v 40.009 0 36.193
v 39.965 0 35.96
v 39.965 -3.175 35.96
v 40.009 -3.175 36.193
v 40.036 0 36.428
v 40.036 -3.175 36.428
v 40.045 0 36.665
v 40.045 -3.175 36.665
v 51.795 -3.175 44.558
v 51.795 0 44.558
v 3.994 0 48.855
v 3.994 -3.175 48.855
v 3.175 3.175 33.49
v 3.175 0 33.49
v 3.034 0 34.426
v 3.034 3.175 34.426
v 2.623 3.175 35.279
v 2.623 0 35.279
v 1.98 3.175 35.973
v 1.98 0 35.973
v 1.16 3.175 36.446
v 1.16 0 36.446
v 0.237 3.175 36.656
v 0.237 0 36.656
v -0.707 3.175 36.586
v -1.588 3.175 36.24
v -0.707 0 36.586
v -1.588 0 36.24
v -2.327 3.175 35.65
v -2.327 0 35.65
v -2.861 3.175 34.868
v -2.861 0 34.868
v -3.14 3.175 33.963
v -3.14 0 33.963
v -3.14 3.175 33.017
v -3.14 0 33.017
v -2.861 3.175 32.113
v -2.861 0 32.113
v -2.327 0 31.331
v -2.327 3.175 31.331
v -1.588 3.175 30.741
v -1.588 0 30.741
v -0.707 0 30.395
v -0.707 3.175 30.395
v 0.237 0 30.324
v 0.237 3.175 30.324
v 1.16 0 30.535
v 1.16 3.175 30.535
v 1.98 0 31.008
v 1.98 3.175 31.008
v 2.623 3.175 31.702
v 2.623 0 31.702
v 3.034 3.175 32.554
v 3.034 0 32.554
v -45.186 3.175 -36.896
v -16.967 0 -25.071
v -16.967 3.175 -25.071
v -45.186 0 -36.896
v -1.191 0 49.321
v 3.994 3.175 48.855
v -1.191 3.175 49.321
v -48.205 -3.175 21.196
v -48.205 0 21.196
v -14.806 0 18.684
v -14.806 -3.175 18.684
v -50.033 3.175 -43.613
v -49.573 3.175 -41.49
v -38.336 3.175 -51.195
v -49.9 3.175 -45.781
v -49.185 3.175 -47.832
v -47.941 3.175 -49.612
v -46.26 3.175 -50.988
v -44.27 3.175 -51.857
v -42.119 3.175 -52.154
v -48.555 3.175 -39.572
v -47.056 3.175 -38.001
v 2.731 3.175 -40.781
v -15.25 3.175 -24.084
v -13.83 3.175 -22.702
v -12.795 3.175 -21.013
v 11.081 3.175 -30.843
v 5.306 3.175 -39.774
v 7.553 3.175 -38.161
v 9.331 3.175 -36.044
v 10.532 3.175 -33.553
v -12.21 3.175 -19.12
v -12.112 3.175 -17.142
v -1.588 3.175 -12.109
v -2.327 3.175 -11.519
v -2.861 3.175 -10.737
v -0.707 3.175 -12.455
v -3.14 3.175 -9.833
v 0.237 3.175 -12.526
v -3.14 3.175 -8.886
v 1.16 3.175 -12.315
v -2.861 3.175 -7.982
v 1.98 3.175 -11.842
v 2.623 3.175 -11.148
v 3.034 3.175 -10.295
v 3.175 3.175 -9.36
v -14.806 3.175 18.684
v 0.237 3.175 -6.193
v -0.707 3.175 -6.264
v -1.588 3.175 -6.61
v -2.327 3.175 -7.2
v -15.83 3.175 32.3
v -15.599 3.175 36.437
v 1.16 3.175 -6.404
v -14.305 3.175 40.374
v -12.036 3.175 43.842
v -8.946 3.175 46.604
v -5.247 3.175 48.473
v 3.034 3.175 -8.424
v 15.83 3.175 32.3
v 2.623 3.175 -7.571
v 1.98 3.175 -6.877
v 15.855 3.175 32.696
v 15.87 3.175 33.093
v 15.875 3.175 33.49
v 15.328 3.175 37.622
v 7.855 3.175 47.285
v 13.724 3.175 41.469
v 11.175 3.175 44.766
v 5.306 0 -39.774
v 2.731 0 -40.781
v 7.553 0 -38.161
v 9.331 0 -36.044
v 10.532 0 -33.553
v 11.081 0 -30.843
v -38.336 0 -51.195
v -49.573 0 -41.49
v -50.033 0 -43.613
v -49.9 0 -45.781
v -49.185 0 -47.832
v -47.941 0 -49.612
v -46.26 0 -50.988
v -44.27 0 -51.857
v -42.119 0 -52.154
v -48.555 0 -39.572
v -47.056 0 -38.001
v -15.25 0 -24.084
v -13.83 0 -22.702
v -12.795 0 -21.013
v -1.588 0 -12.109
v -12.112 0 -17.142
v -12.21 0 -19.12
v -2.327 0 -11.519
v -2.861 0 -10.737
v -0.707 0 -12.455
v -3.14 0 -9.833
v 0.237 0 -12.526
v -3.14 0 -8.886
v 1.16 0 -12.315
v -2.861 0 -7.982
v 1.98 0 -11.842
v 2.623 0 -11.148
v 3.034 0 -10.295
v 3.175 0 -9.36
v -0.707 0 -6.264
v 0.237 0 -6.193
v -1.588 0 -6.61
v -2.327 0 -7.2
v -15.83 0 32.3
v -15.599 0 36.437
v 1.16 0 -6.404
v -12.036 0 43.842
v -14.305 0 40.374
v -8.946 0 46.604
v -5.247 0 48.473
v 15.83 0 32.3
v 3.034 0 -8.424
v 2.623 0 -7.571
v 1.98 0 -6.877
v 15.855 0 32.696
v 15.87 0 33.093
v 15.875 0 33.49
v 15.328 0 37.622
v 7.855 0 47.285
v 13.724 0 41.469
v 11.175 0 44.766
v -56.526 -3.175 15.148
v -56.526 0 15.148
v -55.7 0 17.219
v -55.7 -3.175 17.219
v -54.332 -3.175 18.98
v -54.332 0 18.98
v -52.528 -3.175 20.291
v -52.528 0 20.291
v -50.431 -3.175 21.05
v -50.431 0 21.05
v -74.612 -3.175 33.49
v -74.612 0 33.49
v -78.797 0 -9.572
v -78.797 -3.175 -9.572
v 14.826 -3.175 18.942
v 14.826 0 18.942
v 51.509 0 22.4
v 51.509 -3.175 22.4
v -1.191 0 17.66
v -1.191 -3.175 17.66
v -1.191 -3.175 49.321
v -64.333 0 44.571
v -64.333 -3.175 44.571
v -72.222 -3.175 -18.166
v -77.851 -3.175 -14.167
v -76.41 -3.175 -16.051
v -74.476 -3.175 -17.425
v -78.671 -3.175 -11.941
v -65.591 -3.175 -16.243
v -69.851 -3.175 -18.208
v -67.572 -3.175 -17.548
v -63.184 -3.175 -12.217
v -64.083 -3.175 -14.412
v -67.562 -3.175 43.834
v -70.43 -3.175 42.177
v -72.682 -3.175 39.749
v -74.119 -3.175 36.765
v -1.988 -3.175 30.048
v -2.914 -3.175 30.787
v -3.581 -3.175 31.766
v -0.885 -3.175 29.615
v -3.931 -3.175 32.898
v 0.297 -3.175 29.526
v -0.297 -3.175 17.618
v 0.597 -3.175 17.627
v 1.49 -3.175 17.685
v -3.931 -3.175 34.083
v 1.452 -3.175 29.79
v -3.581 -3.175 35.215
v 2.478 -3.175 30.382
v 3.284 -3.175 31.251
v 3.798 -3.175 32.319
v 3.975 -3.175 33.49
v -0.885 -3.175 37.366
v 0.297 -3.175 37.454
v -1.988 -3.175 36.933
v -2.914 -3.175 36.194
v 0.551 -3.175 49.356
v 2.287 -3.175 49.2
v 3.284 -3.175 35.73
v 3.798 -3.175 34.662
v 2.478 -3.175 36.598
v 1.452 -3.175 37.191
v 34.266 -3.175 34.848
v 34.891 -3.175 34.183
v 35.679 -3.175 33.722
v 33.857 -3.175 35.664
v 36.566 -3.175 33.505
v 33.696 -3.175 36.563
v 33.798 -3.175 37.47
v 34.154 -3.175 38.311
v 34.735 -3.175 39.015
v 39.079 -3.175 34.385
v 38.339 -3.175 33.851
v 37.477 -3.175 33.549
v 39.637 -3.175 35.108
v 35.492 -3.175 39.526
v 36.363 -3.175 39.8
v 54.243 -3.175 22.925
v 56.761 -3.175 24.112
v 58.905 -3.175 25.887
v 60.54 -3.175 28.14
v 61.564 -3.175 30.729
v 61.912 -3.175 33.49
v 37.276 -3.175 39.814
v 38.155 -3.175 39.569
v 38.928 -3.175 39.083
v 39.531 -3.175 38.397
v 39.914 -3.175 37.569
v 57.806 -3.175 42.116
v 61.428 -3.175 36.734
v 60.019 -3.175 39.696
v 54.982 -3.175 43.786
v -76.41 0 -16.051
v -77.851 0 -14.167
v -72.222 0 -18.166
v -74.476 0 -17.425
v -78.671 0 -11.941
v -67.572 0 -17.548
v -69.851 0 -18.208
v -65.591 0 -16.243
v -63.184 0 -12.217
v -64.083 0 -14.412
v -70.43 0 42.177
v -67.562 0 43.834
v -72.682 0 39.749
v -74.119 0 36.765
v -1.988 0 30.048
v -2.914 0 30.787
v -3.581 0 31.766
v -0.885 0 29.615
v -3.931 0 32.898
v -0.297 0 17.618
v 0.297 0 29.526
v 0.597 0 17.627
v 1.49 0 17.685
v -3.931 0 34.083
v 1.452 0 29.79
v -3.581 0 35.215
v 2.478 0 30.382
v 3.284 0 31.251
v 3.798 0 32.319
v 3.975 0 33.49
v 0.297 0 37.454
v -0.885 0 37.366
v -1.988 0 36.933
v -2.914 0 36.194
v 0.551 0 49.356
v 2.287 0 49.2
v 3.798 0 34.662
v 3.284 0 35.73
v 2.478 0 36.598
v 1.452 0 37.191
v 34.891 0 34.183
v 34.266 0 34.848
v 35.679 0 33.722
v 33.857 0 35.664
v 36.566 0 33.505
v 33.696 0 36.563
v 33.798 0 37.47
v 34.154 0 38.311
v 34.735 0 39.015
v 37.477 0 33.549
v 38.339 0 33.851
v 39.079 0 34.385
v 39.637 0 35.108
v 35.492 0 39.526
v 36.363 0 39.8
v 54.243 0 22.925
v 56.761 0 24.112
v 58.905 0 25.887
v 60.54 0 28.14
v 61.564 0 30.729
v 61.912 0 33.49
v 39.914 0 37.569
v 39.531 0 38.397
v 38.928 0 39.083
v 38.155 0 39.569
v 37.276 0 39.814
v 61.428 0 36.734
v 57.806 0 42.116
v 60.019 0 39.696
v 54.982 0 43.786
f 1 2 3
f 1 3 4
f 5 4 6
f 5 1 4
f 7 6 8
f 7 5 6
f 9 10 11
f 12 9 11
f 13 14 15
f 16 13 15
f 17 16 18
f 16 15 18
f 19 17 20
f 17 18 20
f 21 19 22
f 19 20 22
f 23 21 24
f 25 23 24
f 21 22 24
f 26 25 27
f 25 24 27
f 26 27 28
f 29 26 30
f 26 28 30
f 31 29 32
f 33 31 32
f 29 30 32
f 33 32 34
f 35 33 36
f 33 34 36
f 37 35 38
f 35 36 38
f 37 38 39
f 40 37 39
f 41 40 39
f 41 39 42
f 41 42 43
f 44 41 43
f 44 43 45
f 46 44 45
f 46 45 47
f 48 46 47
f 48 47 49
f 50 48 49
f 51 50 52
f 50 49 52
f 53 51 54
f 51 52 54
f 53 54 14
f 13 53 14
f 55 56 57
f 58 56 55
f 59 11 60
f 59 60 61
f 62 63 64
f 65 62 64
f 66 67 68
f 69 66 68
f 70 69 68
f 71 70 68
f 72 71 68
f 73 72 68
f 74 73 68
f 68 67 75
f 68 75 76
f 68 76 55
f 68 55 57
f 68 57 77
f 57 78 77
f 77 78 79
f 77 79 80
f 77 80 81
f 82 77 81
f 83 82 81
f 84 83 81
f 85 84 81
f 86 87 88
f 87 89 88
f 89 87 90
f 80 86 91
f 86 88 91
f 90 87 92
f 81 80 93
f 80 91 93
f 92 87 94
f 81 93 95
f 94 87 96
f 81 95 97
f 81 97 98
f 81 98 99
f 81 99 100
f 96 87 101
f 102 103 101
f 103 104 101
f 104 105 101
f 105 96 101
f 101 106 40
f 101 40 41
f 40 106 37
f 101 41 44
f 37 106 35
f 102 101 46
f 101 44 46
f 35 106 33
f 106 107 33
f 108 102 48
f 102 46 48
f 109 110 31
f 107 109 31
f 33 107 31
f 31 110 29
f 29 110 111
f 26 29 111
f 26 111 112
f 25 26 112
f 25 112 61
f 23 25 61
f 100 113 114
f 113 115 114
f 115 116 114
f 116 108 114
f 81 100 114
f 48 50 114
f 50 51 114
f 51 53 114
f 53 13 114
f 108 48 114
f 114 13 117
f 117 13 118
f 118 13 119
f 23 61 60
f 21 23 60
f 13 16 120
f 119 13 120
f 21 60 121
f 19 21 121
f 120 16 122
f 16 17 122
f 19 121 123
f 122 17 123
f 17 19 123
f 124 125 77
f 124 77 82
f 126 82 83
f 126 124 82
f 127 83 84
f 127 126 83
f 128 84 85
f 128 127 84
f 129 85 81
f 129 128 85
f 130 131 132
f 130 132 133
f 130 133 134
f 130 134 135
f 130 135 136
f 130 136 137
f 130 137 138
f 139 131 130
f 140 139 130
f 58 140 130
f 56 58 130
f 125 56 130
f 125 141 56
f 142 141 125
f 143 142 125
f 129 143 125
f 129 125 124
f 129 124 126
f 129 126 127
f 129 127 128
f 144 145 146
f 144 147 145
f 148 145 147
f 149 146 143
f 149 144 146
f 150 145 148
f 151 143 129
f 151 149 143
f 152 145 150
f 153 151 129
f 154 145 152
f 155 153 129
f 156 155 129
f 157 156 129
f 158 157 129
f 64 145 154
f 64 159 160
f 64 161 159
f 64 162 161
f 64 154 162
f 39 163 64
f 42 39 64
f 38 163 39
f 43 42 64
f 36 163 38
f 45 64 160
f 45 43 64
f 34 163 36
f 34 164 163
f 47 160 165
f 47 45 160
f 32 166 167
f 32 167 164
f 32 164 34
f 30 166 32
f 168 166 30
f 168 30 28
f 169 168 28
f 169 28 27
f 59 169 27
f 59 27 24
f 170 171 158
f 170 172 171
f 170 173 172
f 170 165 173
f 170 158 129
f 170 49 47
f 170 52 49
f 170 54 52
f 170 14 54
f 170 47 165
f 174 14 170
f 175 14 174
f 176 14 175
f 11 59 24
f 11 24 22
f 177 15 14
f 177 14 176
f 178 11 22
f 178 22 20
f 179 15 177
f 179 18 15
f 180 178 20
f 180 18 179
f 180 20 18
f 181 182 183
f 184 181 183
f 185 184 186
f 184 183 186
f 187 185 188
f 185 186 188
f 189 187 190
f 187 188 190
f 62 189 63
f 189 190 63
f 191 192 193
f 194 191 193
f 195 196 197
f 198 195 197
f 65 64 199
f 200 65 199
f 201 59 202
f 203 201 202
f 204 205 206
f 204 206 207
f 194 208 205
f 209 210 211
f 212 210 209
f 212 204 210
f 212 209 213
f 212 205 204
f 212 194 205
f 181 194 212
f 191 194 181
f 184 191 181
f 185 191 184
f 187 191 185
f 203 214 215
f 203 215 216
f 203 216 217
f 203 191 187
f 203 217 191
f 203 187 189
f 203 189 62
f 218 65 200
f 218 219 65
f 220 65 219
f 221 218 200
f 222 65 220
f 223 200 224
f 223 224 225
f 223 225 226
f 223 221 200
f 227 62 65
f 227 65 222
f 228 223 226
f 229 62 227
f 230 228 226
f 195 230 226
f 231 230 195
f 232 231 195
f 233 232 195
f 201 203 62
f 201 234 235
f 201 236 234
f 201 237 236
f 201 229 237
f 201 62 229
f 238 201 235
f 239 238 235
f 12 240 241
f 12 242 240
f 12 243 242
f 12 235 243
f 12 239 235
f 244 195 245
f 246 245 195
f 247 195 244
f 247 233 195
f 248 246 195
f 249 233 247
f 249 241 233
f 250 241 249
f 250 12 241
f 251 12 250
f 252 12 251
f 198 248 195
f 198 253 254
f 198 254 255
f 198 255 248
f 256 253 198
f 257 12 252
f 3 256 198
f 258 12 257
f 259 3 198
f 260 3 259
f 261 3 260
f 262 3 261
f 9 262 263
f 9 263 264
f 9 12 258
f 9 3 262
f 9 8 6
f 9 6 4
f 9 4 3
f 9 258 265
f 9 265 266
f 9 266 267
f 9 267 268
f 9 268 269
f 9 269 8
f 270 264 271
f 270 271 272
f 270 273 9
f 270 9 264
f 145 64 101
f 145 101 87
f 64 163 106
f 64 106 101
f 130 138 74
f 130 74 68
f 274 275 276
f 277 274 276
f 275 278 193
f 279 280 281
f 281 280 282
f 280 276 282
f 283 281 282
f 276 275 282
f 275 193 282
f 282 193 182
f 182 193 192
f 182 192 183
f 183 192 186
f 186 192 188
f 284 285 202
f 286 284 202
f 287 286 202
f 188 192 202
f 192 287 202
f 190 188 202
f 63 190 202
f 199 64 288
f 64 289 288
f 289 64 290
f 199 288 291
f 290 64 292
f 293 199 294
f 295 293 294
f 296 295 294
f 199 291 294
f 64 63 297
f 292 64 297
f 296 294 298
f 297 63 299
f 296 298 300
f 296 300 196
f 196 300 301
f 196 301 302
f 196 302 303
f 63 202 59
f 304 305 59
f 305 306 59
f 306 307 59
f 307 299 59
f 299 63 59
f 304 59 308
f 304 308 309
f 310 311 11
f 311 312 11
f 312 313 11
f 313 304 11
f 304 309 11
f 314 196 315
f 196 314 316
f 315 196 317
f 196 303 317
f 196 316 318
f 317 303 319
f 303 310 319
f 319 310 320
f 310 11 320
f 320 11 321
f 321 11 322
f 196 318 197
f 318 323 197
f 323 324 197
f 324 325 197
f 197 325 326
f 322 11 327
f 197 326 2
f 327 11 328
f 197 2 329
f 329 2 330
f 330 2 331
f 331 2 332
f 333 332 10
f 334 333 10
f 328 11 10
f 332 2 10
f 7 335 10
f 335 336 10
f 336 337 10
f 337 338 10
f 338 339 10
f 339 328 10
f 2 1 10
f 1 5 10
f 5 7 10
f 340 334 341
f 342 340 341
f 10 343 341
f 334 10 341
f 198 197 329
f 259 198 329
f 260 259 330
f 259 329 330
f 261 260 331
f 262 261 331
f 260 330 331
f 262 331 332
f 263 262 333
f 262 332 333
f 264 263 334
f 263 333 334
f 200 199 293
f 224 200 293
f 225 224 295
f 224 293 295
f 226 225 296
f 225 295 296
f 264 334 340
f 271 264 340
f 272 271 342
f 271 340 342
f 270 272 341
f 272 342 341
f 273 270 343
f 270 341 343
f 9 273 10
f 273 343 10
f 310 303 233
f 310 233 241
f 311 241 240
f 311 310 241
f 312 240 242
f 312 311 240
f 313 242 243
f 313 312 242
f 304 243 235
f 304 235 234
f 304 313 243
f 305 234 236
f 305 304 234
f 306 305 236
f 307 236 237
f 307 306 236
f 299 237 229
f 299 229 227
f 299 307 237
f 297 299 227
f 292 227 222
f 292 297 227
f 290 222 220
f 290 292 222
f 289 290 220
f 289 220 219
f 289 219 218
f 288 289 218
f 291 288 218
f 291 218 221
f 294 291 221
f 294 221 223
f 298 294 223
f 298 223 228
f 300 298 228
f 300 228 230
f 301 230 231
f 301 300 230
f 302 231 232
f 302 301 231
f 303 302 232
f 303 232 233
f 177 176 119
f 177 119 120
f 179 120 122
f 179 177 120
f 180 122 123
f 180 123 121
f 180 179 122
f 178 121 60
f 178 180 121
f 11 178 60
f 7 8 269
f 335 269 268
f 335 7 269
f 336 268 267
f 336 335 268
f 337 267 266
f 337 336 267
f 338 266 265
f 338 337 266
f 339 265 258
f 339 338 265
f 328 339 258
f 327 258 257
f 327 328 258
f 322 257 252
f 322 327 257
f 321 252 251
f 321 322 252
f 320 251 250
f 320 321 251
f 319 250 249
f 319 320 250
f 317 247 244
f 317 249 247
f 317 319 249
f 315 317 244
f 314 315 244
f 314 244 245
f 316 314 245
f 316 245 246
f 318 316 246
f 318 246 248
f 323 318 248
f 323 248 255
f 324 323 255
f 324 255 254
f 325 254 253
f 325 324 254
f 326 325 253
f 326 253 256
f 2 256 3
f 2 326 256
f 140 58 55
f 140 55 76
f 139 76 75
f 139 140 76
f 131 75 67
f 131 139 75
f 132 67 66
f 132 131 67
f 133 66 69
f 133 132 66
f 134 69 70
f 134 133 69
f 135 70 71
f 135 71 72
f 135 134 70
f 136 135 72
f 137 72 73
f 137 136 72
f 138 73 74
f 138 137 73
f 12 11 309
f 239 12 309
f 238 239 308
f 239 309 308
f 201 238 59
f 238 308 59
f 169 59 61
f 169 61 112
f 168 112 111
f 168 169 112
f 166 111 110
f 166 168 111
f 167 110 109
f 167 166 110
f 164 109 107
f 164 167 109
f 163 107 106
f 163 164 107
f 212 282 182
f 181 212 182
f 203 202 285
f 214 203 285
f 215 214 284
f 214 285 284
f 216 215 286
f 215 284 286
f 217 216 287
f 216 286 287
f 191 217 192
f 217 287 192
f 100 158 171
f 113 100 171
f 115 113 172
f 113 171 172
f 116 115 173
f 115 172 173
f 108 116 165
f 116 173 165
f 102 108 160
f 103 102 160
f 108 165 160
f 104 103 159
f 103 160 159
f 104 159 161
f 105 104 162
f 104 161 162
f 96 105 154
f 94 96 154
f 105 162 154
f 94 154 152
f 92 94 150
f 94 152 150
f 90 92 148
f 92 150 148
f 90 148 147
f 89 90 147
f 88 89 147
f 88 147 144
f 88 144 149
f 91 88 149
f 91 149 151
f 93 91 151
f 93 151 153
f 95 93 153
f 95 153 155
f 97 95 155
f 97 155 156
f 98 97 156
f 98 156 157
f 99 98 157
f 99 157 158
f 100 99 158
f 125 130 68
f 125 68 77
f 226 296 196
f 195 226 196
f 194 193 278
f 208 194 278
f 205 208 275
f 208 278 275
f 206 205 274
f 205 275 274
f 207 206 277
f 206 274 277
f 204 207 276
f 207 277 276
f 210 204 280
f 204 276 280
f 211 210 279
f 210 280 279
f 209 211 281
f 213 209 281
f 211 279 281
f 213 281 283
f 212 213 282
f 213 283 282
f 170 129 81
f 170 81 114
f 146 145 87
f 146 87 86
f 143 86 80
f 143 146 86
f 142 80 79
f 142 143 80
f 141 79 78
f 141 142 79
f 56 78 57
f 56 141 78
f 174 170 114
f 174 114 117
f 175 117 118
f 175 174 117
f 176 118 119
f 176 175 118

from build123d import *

# Parameters (mm, degrees)
F0_R     = 3.9751
F0_R_2   = 3.175
F1_DEPTH = 3.175
F2_DEPTH = 3.175
F3_DEPTH = 25.4
F4_DEPTH = 25.4


with BuildPart() as f1:
    # F0 (on Front) → F1 (new body)
    with BuildSketch(Plane.XZ):
        with BuildLine():
            ThreePointArc((-15.8302885984, 32.29963418), (-12.0356034274, 43.8420645847), (-1.190625, 49.3205477784))
            Line((-1.190625, 49.3205477784), (-64.3334375, 44.5714611988))
            ThreePointArc((-64.3334375, 44.5714611988), (-55.9426829486, 41.6373209346), (-52.3875, 33.49025918))
            ThreePointArc((-52.3875, 33.49025918), (-55.9442909745, 25.3417060954), (-64.3378113381, 22.4093869935))
            ThreePointArc((-64.3378113381, 22.4093869935), (-71.6485530846, 25.9345501545), (-74.6125, 33.49025918))
            Line((-74.6125, 33.49025918), (-78.7971892056, -9.5722352694))
            ThreePointArc((-78.7971892056, -9.5722352694), (-70.5125901007, -2.411771439), (-62.9594042993, -10.3399622065))
            ThreePointArc((-62.9594042993, -10.3399622065), (-63.0158587984, -11.2849638271), (-63.1844192443, -12.2165230305))
            Line((-63.1844192443, -12.2165230305), (-56.5262833311, 15.1477771658))
            ThreePointArc((-56.5262833311, 15.1477771658), (-53.4757934993, 19.6990979582), (-48.2051933, 21.1960223745))
            Line((-48.2051933, 21.1960223745), (-14.8062337279, 18.6840254521))
            Line((-14.8062337279, 18.6840254521), (-15.8302885984, 32.29963418))
        make_face()
        with BuildLine():
            Line((3.9944345899, 48.8545072028), (-1.190625, 49.3205477784))
            ThreePointArc((-1.190625, 49.3205477784), (-12.0356034274, 43.8420645847), (-15.8302885984, 32.29963418))
            ThreePointArc((-15.8302885984, 32.29963418), (-11.2253201513, 22.2649390286), (-1.190625, 17.6599705815))
            ThreePointArc((-1.190625, 17.6599705815), (0.1501525732, 17.6159692996), (1.4898579206, 17.6853248752))
            ThreePointArc((1.4898579206, 17.6853248752), (11.3309919236, 22.3716150618), (15.8302885984, 32.29963418))
            ThreePointArc((15.8302885984, 32.29963418), (15.8638182116, 32.8945270673), (15.875, 33.49025918))
            ThreePointArc((15.875, 33.49025918), (12.5584090178, 43.2011802456), (3.9944345899, 48.8545072028))
        make_face()
        with Locations((0, 33.49025918)):
            Circle(F0_R, mode=Mode.SUBTRACT)
        with BuildLine():
            Line((51.7947971649, 44.5581422138), (3.9944345899, 48.8545072028))
            ThreePointArc((3.9944345899, 48.8545072028), (12.5584090178, 43.2011802456), (15.875, 33.49025918))
            ThreePointArc((15.875, 33.49025918), (15.8638182116, 32.8945270673), (15.8302885984, 32.29963418))
            Line((15.8302885984, 32.29963418), (14.8256687681, 18.9424294803))
            Line((14.8256687681, 18.9424294803), (51.5091408873, 22.4004090704))
            ThreePointArc((51.5091408873, 22.4004090704), (42.3386131595, 26.2866080928), (39.9653564365, 35.9597034699))
            ThreePointArc((39.9653564365, 35.9597034699), (44.2663232789, 42.4790702668), (51.7947971649, 44.5581422138))
        make_face()
        with BuildLine():
            ThreePointArc((40.044744035, 36.66525918), (40.0248347132, 36.3102552184), (39.9653564365, 35.9597034699))
            ThreePointArc((39.9653564365, 35.9597034699), (33.7146533569, 37.0202631415), (40.044744035, 36.66525918))
        make_face(mode=Mode.SUBTRACT)
        with BuildLine():
            ThreePointArc((-52.3875, 33.49025918), (-55.9426829486, 41.6373209346), (-64.3334375, 44.5714611988))
            ThreePointArc((-64.3334375, 44.5714611988), (-71.6470617547, 41.0475762314), (-74.6125, 33.49025918))
            ThreePointArc((-74.6125, 33.49025918), (-71.6485530846, 25.9345501545), (-64.3378113381, 22.4093869935))
            ThreePointArc((-64.3378113381, 22.4093869935), (-55.9442909745, 25.3417060954), (-52.3875, 33.49025918))
        make_face()
        with Locations((-63.5, 33.49025918)):
            Circle(F0_R_2, mode=Mode.SUBTRACT)
        with BuildLine():
            ThreePointArc((61.9125, 33.49025918), (59.0019003818, 40.9880246056), (51.7947971649, 44.5581422138))
            ThreePointArc((51.7947971649, 44.5581422138), (44.2663232789, 42.4790702668), (39.9653564365, 35.9597034699))
            ThreePointArc((39.9653564365, 35.9597034699), (42.3386131595, 26.2866080928), (51.5091408873, 22.4004090704))
            ThreePointArc((51.5091408873, 22.4004090704), (58.9045661315, 25.8873870865), (61.9125, 33.49025918))
        make_face()
        with Locations((50.8, 33.49025918)):
            Circle(F0_R_2, mode=Mode.SUBTRACT)
        with BuildLine():
            ThreePointArc((-62.9594042993, -10.3399622065), (-70.5125901007, -2.411771439), (-78.7971892056, -9.5722352694))
            ThreePointArc((-78.7971892056, -9.5722352694), (-72.2223784171, -18.166010035), (-63.1844192443, -12.2165230305))
            ThreePointArc((-63.1844192443, -12.2165230305), (-63.0158587984, -11.2849638271), (-62.9594042993, -10.3399622065))
        make_face()
        with Locations((-70.8969042993, -10.3399622065)):
            Circle(F0_R_2, mode=Mode.SUBTRACT)
        with BuildLine():
            ThreePointArc((-1.190625, 17.6599705815), (-11.2253201513, 22.2649390286), (-15.8302885984, 32.29963418))
            Line((-15.8302885984, 32.29963418), (-14.8062337279, 18.6840254521))
            Line((-14.8062337279, 18.6840254521), (-1.190625, 17.6599705815))
        make_face()
        with BuildLine():
            ThreePointArc((15.8302885984, 32.29963418), (11.3309919236, 22.3716150618), (1.4898579206, 17.6853248752))
            Line((1.4898579206, 17.6853248752), (14.8256687681, 18.9424294803))
            Line((14.8256687681, 18.9424294803), (15.8302885984, 32.29963418))
        make_face()
        with Locations((-70.8969042993, -10.3399622065)):
            Circle(F0_R_2)
        with Locations((-63.5, 33.49025918)):
            Circle(F0_R_2)
        with Locations((50.8, 33.49025918)):
            Circle(F0_R_2)
        with BuildLine():
            ThreePointArc((40.044744035, 36.66525918), (33.7146533569, 37.0202631415), (39.9653564365, 35.9597034699))
            ThreePointArc((39.9653564365, 35.9597034699), (40.0248347132, 36.3102552184), (40.044744035, 36.66525918))
        make_face()
        with BuildLine():
            ThreePointArc((3.9944345899, 48.8545072028), (1.4211388069, 49.3015206569), (-1.190625, 49.3205477784))
            Line((-1.190625, 49.3205477784), (3.9944345899, 48.8545072028))
        make_face()
    extrude(amount=F1_DEPTH)

    # F0 (on Front) → F3 (cut)
    with BuildSketch(Plane.XZ):
        with BuildLine():
            ThreePointArc((40.044744035, 36.66525918), (33.7146533569, 37.0202631415), (39.9653564365, 35.9597034699))
            ThreePointArc((39.9653564365, 35.9597034699), (40.0248347132, 36.3102552184), (40.044744035, 36.66525918))
        make_face()
        with Locations((0, -9.35954082)):
            Circle(F0_R_2)
    extrude(amount=F3_DEPTH, mode=Mode.SUBTRACT)


with BuildPart() as f2:
    # F0 (on Front) → F2 (new body)
    with BuildSketch(Plane.XZ):
        with BuildLine():
            ThreePointArc((1.4898579206, 17.6853248752), (0.1501525732, 17.6159692996), (-1.190625, 17.6599705815))
            Line((-1.190625, 17.6599705815), (-14.8062337279, 18.6840254521))
            Line((-14.8062337279, 18.6840254521), (-12.1116893515, -17.1420449896))
            ThreePointArc((-12.1116893515, -17.1420449896), (-13.2595136069, -21.8901160153), (-16.9669465589, -25.0707794514))
            Line((-16.9669465589, -25.0707794514), (-45.1862193725, -36.8956038792))
            ThreePointArc((-45.1862193725, -36.8956038792), (-37.7223000594, -37.6075280366), (-34.1810762788, -44.2163601311))
            ThreePointArc((-34.1810762788, -44.2163601311), (-35.298561103, -48.2773082042), (-38.3363642794, -51.1948111513))
            Line((-38.3363642794, -51.1948111513), (2.7313370812, -40.7813448788))
            ThreePointArc((2.7313370812, -40.7813448788), (-8.7703945055, -23.1856777732), (11.1125, -30.00974082))
            ThreePointArc((11.1125, -30.00974082), (11.1046727481, -30.4267532989), (11.0812020189, -30.84317832))
            Line((11.0812020189, -30.84317832), (14.8256687681, 18.9424294803))
            Line((14.8256687681, 18.9424294803), (1.4898579206, 17.6853248752))
        make_face()
        with Locations((0, -9.35954082)):
            Circle(F0_R_2, mode=Mode.SUBTRACT)
        with BuildLine():
            Line((3.9944345899, 48.8545072028), (-1.190625, 49.3205477784))
            ThreePointArc((-1.190625, 49.3205477784), (-12.0356034274, 43.8420645847), (-15.8302885984, 32.29963418))
            ThreePointArc((-15.8302885984, 32.29963418), (-11.2253201513, 22.2649390286), (-1.190625, 17.6599705815))
            ThreePointArc((-1.190625, 17.6599705815), (0.1501525732, 17.6159692996), (1.4898579206, 17.6853248752))
            ThreePointArc((1.4898579206, 17.6853248752), (11.3309919236, 22.3716150618), (15.8302885984, 32.29963418))
            ThreePointArc((15.8302885984, 32.29963418), (15.8638182116, 32.8945270673), (15.875, 33.49025918))
            ThreePointArc((15.875, 33.49025918), (12.5584090178, 43.2011802456), (3.9944345899, 48.8545072028))
        make_face()
        with Locations((0, 33.49025918)):
            Circle(F0_R, mode=Mode.SUBTRACT)
        with BuildLine():
            ThreePointArc((2.7313370812, -40.7813448788), (8.50813421, -37.1581188539), (11.0812020189, -30.84317832))
            ThreePointArc((11.0812020189, -30.84317832), (11.1046727481, -30.4267532989), (11.1125, -30.00974082))
            ThreePointArc((11.1125, -30.00974082), (-8.7703945055, -23.1856777732), (2.7313370812, -40.7813448788))
        make_face()
        with Locations((0, -30.00974082)):
            Circle(F0_R_2, mode=Mode.SUBTRACT)
        with BuildLine():
            ThreePointArc((-34.1810762788, -44.2163601311), (-37.7223000594, -37.6075280366), (-45.1862193725, -36.8956038792))
            ThreePointArc((-45.1862193725, -36.8956038792), (-49.9003629952, -45.7808733941), (-42.1185762788, -52.1538601311))
            Line((-42.1185762788, -52.1538601311), (-38.3363642794, -51.1948111513))
            ThreePointArc((-38.3363642794, -51.1948111513), (-35.298561103, -48.2773082042), (-34.1810762788, -44.2163601311))
        make_face()
        with Locations((-42.1185762788, -44.2163601311)):
            Circle(F0_R_2, mode=Mode.SUBTRACT)
        with Locations((0, 33.49025918)):
            Circle(F0_R)
        with Locations((0, 33.49025918)):
            Circle(F0_R_2, mode=Mode.SUBTRACT)
        with BuildLine():
            ThreePointArc((-1.190625, 17.6599705815), (-11.2253201513, 22.2649390286), (-15.8302885984, 32.29963418))
            Line((-15.8302885984, 32.29963418), (-14.8062337279, 18.6840254521))
            Line((-14.8062337279, 18.6840254521), (-1.190625, 17.6599705815))
        make_face()
        with BuildLine():
            ThreePointArc((15.8302885984, 32.29963418), (11.3309919236, 22.3716150618), (1.4898579206, 17.6853248752))
            Line((1.4898579206, 17.6853248752), (14.8256687681, 18.9424294803))
            Line((14.8256687681, 18.9424294803), (15.8302885984, 32.29963418))
        make_face()
        with Locations((0, -30.00974082)):
            Circle(F0_R_2)
        with Locations((-42.1185762788, -44.2163601311)):
            Circle(F0_R_2)
        with Locations((0, -9.35954082)):
            Circle(F0_R_2)
    extrude(amount=-F2_DEPTH)

    # F0 (on Front) → F4 (cut)
    with BuildSketch(Plane.XZ):
        with Locations((0, -9.35954082)):
            Circle(F0_R_2)
    extrude(amount=-F4_DEPTH, mode=Mode.SUBTRACT)


solid = Compound([f1.part, f2.part])
